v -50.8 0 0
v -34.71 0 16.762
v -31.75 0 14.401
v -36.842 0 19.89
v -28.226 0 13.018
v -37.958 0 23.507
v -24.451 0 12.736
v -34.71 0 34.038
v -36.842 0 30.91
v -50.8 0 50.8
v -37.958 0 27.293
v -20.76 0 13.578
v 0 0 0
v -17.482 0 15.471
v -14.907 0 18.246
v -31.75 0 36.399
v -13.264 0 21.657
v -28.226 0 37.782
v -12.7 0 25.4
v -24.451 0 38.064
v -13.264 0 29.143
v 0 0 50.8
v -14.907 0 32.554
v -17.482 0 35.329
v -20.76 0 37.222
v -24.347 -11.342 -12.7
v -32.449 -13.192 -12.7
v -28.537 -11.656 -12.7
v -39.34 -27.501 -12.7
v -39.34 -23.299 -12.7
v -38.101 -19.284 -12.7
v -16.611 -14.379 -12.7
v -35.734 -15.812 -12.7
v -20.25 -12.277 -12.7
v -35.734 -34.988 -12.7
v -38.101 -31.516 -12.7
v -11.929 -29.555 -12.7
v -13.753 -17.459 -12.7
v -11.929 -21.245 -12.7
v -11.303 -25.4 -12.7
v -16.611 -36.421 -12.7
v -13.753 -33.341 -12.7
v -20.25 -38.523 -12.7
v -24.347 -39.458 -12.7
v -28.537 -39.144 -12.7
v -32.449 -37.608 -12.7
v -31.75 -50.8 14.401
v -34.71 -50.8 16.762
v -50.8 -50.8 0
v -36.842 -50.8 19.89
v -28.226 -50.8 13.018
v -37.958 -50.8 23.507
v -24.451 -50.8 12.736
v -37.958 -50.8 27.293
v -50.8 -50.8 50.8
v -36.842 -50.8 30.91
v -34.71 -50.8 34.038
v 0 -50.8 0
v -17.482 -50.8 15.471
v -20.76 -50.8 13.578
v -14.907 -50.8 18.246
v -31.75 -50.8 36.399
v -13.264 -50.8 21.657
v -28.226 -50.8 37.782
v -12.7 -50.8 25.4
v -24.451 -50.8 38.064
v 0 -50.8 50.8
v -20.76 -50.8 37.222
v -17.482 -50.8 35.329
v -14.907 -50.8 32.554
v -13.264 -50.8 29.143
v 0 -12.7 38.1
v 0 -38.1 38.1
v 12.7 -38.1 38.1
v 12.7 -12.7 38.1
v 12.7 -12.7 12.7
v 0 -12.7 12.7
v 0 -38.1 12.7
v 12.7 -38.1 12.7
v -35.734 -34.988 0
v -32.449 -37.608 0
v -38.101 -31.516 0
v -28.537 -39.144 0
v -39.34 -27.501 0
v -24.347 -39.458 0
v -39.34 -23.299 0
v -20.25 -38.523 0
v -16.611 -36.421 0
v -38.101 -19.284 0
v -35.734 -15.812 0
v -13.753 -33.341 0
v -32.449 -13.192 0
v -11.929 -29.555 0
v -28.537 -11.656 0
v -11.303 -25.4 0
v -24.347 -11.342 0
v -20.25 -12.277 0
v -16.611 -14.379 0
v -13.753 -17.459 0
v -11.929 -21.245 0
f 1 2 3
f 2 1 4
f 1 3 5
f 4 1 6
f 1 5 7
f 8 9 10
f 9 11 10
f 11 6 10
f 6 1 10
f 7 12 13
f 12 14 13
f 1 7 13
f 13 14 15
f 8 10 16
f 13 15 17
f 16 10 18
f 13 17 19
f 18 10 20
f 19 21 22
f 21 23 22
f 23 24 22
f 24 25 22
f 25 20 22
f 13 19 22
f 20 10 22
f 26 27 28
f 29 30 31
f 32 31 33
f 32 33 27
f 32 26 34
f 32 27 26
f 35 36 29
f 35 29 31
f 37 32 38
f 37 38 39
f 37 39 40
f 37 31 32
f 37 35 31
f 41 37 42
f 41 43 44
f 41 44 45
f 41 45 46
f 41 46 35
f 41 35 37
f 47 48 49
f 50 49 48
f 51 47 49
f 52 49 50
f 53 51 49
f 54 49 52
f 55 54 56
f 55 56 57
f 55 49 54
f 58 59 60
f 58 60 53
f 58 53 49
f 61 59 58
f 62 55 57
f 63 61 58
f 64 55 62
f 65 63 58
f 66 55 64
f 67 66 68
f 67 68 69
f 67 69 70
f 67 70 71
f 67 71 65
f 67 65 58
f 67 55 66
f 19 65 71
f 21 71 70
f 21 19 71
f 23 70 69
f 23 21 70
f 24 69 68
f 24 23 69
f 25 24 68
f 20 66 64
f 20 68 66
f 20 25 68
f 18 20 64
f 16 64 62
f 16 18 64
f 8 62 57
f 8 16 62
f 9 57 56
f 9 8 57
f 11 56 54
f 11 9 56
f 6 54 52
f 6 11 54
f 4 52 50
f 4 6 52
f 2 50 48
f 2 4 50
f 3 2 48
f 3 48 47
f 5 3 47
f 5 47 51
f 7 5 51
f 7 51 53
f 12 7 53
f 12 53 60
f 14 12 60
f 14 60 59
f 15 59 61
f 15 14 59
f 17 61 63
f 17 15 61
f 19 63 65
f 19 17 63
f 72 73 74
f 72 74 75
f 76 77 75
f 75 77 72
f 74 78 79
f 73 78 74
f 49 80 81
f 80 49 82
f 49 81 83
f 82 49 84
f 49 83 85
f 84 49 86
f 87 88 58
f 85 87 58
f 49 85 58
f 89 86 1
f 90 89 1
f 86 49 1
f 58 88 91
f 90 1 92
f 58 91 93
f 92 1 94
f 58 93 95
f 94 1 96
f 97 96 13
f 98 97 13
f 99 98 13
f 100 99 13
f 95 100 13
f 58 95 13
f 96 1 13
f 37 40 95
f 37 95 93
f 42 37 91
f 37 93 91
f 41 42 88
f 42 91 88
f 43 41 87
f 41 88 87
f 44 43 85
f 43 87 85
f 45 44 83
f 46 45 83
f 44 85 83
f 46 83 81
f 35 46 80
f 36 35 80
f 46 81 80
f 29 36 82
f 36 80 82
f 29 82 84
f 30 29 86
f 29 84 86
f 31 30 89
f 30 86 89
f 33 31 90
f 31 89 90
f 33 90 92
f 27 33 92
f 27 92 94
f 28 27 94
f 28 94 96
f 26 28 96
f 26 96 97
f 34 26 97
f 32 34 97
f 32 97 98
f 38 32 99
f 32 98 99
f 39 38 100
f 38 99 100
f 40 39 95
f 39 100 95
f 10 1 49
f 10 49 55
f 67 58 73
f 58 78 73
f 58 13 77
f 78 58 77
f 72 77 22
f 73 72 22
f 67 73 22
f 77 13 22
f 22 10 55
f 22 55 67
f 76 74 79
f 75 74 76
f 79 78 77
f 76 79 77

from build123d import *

# Parameters (mm, degrees)
F0_W     = 50.8
F0_H     = 50.8
F2_DEPTH = 50.8
F1_R     = 12.7
F3_DEPTH = 51.308
F4_W     = 25.4
F4_H     = 25.4
F5_DEPTH = 12.7
F6_R     = 14.097
F7_DEPTH = 12.7


with BuildPart() as f2:
    # F0 (on Front) → F2 (new body)
    with BuildSketch(Plane.XZ):
        with Locations((-25.4, 25.4)):
            Rectangle(F0_W, F0_H)
    extrude(amount=F2_DEPTH)

    # F1 (on face) → F3 (cut)
    with BuildSketch(Plane.XZ):
        with Locations((-25.4, 25.4)):
            Circle(F1_R)
    extrude(amount=F3_DEPTH, mode=Mode.SUBTRACT)

    # F4 (on face) → F5 (join)
    with BuildSketch(Plane.YZ):
        with Locations((-25.4, 25.4)):
            Rectangle(F4_W, F4_H)
    extrude(amount=F5_DEPTH)

    # F6 (on face) → F7 (join)
    with BuildSketch(Plane(origin=(0, 0, 0), x_dir=(1, 0, 0), z_dir=(0, 0, -1))):
        with Locations((-25.4, 25.4)):
            Circle(F6_R)
    extrude(amount=F7_DEPTH)


solid = f2.part
